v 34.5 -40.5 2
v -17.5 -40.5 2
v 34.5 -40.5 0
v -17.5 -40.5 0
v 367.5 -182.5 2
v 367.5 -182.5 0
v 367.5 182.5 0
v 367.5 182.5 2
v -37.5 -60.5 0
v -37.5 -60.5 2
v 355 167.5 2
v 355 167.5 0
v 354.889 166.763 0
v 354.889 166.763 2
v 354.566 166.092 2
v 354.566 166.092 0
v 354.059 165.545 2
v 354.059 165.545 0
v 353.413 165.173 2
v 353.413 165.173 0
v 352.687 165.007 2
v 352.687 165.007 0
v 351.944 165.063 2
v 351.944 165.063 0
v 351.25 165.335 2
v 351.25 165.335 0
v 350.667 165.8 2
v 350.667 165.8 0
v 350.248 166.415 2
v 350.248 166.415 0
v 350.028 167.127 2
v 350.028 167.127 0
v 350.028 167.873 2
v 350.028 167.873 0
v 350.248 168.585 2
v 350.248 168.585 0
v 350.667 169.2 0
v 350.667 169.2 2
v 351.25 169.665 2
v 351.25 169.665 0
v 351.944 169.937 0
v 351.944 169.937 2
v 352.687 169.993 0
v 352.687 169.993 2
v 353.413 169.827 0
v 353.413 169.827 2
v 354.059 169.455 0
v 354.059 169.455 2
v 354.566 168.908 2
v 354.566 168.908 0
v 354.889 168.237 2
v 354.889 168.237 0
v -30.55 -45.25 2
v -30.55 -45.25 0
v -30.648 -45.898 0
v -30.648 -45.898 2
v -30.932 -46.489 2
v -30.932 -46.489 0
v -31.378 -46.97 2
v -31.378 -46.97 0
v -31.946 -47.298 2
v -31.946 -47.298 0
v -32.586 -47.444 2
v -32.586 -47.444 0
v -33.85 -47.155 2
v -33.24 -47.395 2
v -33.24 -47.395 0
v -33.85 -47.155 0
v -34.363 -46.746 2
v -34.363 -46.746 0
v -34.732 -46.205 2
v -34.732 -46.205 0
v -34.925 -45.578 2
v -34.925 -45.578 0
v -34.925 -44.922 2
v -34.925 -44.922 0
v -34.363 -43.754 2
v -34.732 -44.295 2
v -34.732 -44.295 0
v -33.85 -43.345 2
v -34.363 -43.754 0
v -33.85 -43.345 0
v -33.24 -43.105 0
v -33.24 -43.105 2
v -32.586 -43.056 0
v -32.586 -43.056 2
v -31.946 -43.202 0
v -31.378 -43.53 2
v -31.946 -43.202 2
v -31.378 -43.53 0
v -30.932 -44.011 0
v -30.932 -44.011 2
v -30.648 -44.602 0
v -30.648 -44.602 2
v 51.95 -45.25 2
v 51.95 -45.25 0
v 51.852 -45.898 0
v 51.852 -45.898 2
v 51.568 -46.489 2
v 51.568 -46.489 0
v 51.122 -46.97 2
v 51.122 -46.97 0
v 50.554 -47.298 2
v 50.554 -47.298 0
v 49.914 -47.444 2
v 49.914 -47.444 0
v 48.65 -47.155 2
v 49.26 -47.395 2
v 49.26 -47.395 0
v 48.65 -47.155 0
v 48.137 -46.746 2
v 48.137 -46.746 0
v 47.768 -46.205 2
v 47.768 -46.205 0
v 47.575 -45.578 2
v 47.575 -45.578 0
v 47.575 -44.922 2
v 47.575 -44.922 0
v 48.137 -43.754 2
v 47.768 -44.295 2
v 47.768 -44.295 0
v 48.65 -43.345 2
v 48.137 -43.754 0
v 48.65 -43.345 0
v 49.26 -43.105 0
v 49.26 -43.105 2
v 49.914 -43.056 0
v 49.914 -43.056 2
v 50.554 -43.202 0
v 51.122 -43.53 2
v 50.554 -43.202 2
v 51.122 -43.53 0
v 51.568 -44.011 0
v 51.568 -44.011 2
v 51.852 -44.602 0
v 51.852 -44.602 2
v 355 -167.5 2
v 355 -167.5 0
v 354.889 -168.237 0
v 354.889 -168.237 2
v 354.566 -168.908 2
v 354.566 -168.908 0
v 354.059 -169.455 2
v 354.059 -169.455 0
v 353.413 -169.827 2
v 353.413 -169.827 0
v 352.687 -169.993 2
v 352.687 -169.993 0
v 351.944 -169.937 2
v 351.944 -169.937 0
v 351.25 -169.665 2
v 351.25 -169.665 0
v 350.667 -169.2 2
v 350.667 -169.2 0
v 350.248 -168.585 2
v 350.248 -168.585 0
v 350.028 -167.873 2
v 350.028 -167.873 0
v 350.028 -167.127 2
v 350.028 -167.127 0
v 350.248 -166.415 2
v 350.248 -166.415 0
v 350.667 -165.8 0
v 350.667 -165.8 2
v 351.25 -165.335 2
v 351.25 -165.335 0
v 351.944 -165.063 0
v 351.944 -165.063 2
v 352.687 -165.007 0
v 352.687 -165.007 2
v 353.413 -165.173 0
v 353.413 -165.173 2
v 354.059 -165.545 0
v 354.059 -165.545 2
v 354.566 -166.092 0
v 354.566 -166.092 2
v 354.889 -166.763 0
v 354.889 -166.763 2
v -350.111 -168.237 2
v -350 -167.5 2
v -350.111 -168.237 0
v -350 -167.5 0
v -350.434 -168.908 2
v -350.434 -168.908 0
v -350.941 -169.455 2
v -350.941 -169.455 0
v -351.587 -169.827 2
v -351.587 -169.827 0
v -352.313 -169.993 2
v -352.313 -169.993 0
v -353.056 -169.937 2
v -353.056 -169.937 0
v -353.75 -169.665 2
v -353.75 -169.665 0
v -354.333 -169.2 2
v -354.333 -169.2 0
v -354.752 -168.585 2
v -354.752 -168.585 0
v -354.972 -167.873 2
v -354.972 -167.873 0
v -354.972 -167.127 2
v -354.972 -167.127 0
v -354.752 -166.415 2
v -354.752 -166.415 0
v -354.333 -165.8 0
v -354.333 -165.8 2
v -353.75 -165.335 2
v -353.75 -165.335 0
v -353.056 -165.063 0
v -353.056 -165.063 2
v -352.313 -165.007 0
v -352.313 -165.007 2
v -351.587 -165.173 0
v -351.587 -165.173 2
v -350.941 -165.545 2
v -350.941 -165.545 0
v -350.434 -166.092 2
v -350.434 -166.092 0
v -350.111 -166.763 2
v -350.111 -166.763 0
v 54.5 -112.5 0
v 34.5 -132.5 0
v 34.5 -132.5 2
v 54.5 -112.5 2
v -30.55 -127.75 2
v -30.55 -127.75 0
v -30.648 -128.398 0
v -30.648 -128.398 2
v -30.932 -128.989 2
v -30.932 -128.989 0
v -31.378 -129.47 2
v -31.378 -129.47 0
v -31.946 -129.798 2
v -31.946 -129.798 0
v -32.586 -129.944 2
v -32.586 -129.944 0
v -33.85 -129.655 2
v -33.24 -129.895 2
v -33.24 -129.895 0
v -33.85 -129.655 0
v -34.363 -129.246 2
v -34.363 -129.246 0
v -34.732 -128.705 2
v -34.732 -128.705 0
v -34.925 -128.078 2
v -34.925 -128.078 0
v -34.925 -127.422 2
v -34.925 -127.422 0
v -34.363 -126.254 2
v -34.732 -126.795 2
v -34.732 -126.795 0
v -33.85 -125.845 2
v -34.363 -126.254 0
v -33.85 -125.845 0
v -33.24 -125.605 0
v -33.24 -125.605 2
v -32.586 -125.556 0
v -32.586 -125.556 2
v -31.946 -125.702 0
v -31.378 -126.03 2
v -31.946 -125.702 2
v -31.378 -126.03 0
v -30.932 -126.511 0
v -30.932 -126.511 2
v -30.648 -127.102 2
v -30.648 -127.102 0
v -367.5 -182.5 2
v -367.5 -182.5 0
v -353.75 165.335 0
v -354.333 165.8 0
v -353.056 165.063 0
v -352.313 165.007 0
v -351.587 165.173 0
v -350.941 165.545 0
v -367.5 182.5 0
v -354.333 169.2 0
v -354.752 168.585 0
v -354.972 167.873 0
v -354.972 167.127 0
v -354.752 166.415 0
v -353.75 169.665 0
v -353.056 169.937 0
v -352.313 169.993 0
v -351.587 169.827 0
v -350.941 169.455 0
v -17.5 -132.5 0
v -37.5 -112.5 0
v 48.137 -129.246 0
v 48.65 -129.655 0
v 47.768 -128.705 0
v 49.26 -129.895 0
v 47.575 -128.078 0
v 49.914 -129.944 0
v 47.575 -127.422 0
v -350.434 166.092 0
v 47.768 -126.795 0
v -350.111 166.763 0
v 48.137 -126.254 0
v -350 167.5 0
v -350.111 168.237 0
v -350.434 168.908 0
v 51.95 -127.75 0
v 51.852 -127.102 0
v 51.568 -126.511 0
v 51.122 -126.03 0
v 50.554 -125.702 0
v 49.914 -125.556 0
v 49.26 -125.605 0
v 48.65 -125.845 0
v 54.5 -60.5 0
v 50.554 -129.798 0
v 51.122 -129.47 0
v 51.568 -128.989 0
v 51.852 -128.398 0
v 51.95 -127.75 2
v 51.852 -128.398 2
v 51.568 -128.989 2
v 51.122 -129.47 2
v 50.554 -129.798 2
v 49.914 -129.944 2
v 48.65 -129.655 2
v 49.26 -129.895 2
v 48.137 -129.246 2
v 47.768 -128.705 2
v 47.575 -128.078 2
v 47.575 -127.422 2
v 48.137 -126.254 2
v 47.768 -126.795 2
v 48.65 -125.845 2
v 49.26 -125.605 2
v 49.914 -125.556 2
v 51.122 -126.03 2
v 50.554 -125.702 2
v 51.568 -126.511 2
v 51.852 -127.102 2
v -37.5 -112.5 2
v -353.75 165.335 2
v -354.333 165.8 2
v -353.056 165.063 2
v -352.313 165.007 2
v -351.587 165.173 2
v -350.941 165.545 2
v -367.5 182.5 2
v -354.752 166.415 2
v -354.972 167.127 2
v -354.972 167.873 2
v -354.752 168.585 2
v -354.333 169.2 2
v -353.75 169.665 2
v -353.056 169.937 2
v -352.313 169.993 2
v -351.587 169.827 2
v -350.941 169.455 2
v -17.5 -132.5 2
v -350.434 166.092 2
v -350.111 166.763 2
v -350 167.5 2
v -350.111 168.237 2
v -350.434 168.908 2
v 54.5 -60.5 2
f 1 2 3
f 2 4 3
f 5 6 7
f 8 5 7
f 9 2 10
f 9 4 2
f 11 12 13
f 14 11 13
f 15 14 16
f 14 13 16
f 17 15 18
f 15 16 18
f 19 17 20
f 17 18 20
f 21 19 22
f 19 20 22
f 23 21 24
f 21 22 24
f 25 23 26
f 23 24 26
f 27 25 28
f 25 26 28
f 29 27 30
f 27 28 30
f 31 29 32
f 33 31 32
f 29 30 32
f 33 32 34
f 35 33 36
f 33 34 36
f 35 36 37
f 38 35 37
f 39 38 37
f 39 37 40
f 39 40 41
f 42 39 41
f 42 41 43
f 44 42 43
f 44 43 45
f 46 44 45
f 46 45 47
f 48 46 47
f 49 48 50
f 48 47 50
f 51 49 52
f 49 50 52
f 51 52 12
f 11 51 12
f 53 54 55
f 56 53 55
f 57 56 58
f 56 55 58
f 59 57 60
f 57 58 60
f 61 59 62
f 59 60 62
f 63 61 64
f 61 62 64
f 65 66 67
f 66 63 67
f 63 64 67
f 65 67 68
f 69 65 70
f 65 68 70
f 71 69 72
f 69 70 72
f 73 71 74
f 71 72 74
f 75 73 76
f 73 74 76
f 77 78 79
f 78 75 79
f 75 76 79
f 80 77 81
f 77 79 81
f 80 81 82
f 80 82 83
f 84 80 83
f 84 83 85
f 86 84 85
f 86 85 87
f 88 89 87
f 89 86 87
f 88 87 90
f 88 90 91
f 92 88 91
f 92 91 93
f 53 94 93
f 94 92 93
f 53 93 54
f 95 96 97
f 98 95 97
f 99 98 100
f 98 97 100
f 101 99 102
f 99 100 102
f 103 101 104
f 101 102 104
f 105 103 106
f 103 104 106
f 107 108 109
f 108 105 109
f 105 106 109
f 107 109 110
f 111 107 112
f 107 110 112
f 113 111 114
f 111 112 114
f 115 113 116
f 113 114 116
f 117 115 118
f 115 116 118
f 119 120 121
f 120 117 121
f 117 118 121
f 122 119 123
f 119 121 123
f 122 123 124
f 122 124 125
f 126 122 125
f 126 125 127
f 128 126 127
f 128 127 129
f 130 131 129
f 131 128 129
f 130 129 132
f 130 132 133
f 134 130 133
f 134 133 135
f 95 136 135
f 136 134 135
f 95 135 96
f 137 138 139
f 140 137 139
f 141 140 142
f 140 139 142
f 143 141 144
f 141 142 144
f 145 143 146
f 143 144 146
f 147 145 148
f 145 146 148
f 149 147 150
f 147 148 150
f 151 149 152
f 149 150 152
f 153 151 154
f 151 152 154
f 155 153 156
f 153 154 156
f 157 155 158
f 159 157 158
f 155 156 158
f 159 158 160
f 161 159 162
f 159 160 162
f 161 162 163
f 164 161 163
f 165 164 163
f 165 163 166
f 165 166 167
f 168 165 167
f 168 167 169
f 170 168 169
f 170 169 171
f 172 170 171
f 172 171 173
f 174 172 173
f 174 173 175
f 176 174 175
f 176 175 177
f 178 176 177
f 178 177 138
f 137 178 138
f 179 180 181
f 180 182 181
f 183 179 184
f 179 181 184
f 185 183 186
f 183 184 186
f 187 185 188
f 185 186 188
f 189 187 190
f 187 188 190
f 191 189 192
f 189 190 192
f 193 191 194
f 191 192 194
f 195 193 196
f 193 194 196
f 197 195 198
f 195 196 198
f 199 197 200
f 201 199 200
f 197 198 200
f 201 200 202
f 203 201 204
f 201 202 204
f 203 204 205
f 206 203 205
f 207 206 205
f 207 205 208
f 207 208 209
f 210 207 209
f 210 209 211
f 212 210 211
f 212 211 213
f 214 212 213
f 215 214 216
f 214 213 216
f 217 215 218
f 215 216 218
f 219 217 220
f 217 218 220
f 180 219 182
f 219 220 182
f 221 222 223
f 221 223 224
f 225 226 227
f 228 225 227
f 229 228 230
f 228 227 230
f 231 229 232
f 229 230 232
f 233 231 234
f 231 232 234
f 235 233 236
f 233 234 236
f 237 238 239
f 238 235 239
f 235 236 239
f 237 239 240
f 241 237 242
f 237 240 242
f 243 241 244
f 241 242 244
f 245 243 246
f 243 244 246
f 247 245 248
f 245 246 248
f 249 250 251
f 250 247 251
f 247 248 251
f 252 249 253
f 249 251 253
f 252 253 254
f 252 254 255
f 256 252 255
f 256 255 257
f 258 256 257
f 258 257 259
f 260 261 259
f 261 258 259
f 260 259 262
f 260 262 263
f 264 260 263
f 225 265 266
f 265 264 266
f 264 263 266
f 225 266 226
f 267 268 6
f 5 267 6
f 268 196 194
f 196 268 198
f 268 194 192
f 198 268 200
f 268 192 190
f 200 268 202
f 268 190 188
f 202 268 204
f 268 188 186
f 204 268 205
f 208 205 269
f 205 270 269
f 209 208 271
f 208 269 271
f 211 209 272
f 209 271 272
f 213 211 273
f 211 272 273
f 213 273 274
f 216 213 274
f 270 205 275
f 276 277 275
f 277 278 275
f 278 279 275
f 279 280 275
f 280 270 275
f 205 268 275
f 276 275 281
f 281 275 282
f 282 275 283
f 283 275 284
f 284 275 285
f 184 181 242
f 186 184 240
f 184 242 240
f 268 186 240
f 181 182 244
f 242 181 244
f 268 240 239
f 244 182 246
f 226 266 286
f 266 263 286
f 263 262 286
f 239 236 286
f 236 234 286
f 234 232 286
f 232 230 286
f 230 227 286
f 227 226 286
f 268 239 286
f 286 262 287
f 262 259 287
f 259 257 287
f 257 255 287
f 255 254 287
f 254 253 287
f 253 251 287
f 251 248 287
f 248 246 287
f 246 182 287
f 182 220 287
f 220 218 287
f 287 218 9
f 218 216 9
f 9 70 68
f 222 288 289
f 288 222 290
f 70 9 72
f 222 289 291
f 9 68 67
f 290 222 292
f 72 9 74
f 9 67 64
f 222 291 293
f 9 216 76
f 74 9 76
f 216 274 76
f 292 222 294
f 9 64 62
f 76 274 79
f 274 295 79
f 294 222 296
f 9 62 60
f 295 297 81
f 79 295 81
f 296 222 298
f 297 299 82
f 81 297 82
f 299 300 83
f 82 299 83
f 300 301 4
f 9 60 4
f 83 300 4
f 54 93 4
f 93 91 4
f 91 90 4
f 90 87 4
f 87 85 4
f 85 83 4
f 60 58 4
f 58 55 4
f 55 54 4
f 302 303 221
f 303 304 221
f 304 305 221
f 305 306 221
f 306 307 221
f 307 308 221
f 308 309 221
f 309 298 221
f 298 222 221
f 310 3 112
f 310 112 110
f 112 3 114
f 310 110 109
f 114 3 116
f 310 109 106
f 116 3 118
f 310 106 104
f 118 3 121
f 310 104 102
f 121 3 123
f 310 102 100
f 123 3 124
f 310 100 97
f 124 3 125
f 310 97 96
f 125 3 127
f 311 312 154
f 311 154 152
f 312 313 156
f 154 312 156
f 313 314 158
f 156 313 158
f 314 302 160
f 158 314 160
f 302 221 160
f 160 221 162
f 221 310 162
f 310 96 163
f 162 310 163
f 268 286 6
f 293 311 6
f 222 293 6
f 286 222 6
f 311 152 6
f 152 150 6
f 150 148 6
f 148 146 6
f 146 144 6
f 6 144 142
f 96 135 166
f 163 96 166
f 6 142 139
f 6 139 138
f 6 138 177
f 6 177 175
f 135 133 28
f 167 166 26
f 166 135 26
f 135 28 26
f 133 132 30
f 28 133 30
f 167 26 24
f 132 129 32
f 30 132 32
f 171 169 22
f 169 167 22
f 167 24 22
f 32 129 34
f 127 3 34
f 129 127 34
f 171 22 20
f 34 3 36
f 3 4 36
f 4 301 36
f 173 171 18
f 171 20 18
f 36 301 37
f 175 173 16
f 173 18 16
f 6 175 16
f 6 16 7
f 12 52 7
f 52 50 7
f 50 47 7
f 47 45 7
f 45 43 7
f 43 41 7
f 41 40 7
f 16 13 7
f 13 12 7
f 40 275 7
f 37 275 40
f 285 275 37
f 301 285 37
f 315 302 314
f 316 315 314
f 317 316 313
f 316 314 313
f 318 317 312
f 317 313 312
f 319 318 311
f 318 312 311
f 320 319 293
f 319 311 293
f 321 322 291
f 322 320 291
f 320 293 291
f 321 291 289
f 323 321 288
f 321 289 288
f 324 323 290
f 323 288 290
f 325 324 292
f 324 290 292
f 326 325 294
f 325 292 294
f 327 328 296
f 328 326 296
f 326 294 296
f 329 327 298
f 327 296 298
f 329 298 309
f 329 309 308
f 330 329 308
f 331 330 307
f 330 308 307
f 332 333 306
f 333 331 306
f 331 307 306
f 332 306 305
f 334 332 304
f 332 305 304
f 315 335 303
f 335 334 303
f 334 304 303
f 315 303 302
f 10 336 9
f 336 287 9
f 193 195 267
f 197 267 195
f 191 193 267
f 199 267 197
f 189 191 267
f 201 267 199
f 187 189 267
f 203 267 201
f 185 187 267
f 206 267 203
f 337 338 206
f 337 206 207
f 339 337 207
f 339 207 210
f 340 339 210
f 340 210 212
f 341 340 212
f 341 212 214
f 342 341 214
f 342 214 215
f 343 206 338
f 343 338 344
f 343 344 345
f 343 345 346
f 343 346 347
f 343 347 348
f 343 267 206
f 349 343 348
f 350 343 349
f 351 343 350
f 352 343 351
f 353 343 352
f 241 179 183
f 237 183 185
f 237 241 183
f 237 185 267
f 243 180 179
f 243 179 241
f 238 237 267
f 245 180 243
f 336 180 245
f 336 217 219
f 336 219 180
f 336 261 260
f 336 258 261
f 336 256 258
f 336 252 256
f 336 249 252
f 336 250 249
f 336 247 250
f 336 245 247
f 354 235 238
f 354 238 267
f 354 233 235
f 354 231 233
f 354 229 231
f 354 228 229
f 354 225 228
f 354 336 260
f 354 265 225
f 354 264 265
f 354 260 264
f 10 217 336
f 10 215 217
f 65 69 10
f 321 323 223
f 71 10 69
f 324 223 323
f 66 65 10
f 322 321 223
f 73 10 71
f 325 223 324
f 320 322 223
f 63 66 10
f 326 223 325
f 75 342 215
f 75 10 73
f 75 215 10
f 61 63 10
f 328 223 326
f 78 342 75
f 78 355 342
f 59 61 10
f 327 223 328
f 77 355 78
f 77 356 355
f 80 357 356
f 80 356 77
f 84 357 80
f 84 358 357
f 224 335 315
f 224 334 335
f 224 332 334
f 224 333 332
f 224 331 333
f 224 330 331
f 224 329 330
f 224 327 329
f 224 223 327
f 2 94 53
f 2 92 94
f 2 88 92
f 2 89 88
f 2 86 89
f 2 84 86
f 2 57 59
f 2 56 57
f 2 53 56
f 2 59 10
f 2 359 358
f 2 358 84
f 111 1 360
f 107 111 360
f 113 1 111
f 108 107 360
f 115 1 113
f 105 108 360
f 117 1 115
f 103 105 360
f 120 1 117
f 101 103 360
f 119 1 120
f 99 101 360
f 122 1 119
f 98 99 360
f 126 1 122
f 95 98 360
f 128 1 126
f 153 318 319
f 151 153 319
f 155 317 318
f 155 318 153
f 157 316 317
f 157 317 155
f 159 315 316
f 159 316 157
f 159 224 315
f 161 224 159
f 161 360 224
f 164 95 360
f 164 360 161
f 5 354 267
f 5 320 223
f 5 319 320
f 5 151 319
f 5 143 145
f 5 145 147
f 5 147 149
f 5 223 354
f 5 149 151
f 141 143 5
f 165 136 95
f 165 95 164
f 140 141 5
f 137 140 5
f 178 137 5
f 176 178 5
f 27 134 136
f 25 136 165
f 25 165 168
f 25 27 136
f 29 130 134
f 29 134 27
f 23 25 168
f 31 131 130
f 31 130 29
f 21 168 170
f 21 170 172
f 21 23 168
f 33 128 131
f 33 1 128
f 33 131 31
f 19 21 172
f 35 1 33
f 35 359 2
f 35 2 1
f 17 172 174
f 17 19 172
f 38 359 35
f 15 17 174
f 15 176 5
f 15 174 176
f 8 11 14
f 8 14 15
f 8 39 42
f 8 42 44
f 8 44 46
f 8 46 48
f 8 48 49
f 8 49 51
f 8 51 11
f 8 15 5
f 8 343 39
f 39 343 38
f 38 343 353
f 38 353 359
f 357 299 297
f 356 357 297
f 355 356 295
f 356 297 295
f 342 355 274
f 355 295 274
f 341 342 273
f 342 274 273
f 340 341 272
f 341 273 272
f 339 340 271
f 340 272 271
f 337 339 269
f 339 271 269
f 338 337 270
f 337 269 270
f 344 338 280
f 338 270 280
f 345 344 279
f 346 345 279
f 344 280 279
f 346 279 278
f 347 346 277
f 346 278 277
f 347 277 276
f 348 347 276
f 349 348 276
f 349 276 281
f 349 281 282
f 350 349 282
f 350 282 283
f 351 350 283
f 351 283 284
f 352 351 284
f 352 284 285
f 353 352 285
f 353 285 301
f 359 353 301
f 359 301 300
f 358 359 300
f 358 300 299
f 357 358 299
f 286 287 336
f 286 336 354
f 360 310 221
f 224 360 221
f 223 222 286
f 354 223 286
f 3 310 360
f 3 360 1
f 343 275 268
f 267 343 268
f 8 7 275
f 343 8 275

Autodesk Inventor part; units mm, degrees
ref_plane "YZ Plane" through (0, 0, 0) normal (1, 0, 0) x (0, 1, 0)
ref_plane "XZ Plane" through (0, 0, 0) normal (0, 1, 0) x (-1, 0, 0)
ref_plane "XY Plane" through (0, 0, 0) normal (0, 0, 1) x (1, 0, 0)
sketch "Esquisse1" plane through (0, 0, 0) normal (0, 0, 1) x (1, 0, 0)
  line L0 (-367.5, -182.5) -> (367.5, -182.5)
  line L1 (367.5, -182.5) -> (367.5, 182.5)
  line L2 (367.5, 182.5) -> (-367.5, 182.5)
  line L3 (-367.5, 182.5) -> (-367.5, -182.5)
  line L4 (-367.5, -182.5) -> (367.5, 182.5) construction
  line L5 (-355, -170) -> (355, -170)
  line L6 (355, -170) -> (355, 170)
  line L7 (355, 170) -> (-355, 170)
  line L8 (-355, 170) -> (-355, -170)
  line L9 (-355, -170) -> (355, 170) construction
  circle A0 centre (-352.5, 167.5) radius 2.5
  circle A1 centre (-352.5, -167.5) radius 2.5
  circle A2 centre (352.5, -167.5) radius 2.5
  circle A3 centre (352.5, 167.5) radius 2.5
  line L10 (-17.5, -40.5) -> (34.5, -40.5)
  line L11 (54.5, -60.5) -> (54.5, -112.5)
  line L12 (34.5, -132.5) -> (-17.5, -132.5)
  line L13 (-37.5, -112.5) -> (-37.5, -60.5)
  line L14 (-37.5, -40.5) -> (54.5, -132.5) construction
  line L15 (54.5, -40.5) -> (-37.5, -132.5) construction
  line L16 (-17.5, -40.5) -> (-37.5, -60.5)
  line L17 (-37.5, -112.5) -> (-17.5, -132.5)
  line L18 (34.5, -132.5) -> (54.5, -112.5)
  line L19 (54.5, -60.5) -> (34.5, -40.5)
  circle A4 centre (-32.75, -45.25) radius 2.2
  circle A5 centre (49.75, -45.25) radius 2.2
  circle A6 centre (49.75, -127.75) radius 2.2
  circle A7 centre (-32.75, -127.75) radius 2.2
  point P0 (0, 0)
  point P1 (-355, -167.5)
  point P2 (-352.5, -170)
  point P3 (352.5, -170)
  point P4 (355, -167.5)
  point P5 (355, 167.5)
  point P6 (352.5, 170)
  point P7 (-355, 167.5)
  point P8 (-352.5, 170)
  point P9 (8.5, -86.5)
  dimension "d0" = 735
  dimension "d1" = 365
  dimension "d2" = 12.5
  dimension "d3" = 12.5
  dimension "d4" = 5
  dimension "d7" = 5
  dimension "d8" = 5
  dimension "d9" = 5
  dimension "d36" = 92
  dimension "d37" = 92
  dimension "d38" = 50
  dimension "d39" = 313
  dimension "d48" = 20
  dimension "d49" = 20
  dimension "d50" = 20
  dimension "d51" = 20
  dimension "d52" = 20
  dimension "d53" = 20
  dimension "d54" = 20
  dimension "d55" = 20
  dimension "d57" = 4.4
  dimension "d58" = 4.4
  dimension "d59" = 4.4
  dimension "d60" = 4.4
  dimension "d61" = 4.75
  dimension "d62" = 4.75
extrude "Extrusion1" add sketch "Esquisse1" along normal blind 2 contours L3 L2 L1 L0 | L8 A1 L5 | A1 L8 A0 L7 A3 L6 A2 L5 | A2 L6 L5 | L8 L7 A0 | A3 L7 L6
properties part number "PlaqueVentilo"
